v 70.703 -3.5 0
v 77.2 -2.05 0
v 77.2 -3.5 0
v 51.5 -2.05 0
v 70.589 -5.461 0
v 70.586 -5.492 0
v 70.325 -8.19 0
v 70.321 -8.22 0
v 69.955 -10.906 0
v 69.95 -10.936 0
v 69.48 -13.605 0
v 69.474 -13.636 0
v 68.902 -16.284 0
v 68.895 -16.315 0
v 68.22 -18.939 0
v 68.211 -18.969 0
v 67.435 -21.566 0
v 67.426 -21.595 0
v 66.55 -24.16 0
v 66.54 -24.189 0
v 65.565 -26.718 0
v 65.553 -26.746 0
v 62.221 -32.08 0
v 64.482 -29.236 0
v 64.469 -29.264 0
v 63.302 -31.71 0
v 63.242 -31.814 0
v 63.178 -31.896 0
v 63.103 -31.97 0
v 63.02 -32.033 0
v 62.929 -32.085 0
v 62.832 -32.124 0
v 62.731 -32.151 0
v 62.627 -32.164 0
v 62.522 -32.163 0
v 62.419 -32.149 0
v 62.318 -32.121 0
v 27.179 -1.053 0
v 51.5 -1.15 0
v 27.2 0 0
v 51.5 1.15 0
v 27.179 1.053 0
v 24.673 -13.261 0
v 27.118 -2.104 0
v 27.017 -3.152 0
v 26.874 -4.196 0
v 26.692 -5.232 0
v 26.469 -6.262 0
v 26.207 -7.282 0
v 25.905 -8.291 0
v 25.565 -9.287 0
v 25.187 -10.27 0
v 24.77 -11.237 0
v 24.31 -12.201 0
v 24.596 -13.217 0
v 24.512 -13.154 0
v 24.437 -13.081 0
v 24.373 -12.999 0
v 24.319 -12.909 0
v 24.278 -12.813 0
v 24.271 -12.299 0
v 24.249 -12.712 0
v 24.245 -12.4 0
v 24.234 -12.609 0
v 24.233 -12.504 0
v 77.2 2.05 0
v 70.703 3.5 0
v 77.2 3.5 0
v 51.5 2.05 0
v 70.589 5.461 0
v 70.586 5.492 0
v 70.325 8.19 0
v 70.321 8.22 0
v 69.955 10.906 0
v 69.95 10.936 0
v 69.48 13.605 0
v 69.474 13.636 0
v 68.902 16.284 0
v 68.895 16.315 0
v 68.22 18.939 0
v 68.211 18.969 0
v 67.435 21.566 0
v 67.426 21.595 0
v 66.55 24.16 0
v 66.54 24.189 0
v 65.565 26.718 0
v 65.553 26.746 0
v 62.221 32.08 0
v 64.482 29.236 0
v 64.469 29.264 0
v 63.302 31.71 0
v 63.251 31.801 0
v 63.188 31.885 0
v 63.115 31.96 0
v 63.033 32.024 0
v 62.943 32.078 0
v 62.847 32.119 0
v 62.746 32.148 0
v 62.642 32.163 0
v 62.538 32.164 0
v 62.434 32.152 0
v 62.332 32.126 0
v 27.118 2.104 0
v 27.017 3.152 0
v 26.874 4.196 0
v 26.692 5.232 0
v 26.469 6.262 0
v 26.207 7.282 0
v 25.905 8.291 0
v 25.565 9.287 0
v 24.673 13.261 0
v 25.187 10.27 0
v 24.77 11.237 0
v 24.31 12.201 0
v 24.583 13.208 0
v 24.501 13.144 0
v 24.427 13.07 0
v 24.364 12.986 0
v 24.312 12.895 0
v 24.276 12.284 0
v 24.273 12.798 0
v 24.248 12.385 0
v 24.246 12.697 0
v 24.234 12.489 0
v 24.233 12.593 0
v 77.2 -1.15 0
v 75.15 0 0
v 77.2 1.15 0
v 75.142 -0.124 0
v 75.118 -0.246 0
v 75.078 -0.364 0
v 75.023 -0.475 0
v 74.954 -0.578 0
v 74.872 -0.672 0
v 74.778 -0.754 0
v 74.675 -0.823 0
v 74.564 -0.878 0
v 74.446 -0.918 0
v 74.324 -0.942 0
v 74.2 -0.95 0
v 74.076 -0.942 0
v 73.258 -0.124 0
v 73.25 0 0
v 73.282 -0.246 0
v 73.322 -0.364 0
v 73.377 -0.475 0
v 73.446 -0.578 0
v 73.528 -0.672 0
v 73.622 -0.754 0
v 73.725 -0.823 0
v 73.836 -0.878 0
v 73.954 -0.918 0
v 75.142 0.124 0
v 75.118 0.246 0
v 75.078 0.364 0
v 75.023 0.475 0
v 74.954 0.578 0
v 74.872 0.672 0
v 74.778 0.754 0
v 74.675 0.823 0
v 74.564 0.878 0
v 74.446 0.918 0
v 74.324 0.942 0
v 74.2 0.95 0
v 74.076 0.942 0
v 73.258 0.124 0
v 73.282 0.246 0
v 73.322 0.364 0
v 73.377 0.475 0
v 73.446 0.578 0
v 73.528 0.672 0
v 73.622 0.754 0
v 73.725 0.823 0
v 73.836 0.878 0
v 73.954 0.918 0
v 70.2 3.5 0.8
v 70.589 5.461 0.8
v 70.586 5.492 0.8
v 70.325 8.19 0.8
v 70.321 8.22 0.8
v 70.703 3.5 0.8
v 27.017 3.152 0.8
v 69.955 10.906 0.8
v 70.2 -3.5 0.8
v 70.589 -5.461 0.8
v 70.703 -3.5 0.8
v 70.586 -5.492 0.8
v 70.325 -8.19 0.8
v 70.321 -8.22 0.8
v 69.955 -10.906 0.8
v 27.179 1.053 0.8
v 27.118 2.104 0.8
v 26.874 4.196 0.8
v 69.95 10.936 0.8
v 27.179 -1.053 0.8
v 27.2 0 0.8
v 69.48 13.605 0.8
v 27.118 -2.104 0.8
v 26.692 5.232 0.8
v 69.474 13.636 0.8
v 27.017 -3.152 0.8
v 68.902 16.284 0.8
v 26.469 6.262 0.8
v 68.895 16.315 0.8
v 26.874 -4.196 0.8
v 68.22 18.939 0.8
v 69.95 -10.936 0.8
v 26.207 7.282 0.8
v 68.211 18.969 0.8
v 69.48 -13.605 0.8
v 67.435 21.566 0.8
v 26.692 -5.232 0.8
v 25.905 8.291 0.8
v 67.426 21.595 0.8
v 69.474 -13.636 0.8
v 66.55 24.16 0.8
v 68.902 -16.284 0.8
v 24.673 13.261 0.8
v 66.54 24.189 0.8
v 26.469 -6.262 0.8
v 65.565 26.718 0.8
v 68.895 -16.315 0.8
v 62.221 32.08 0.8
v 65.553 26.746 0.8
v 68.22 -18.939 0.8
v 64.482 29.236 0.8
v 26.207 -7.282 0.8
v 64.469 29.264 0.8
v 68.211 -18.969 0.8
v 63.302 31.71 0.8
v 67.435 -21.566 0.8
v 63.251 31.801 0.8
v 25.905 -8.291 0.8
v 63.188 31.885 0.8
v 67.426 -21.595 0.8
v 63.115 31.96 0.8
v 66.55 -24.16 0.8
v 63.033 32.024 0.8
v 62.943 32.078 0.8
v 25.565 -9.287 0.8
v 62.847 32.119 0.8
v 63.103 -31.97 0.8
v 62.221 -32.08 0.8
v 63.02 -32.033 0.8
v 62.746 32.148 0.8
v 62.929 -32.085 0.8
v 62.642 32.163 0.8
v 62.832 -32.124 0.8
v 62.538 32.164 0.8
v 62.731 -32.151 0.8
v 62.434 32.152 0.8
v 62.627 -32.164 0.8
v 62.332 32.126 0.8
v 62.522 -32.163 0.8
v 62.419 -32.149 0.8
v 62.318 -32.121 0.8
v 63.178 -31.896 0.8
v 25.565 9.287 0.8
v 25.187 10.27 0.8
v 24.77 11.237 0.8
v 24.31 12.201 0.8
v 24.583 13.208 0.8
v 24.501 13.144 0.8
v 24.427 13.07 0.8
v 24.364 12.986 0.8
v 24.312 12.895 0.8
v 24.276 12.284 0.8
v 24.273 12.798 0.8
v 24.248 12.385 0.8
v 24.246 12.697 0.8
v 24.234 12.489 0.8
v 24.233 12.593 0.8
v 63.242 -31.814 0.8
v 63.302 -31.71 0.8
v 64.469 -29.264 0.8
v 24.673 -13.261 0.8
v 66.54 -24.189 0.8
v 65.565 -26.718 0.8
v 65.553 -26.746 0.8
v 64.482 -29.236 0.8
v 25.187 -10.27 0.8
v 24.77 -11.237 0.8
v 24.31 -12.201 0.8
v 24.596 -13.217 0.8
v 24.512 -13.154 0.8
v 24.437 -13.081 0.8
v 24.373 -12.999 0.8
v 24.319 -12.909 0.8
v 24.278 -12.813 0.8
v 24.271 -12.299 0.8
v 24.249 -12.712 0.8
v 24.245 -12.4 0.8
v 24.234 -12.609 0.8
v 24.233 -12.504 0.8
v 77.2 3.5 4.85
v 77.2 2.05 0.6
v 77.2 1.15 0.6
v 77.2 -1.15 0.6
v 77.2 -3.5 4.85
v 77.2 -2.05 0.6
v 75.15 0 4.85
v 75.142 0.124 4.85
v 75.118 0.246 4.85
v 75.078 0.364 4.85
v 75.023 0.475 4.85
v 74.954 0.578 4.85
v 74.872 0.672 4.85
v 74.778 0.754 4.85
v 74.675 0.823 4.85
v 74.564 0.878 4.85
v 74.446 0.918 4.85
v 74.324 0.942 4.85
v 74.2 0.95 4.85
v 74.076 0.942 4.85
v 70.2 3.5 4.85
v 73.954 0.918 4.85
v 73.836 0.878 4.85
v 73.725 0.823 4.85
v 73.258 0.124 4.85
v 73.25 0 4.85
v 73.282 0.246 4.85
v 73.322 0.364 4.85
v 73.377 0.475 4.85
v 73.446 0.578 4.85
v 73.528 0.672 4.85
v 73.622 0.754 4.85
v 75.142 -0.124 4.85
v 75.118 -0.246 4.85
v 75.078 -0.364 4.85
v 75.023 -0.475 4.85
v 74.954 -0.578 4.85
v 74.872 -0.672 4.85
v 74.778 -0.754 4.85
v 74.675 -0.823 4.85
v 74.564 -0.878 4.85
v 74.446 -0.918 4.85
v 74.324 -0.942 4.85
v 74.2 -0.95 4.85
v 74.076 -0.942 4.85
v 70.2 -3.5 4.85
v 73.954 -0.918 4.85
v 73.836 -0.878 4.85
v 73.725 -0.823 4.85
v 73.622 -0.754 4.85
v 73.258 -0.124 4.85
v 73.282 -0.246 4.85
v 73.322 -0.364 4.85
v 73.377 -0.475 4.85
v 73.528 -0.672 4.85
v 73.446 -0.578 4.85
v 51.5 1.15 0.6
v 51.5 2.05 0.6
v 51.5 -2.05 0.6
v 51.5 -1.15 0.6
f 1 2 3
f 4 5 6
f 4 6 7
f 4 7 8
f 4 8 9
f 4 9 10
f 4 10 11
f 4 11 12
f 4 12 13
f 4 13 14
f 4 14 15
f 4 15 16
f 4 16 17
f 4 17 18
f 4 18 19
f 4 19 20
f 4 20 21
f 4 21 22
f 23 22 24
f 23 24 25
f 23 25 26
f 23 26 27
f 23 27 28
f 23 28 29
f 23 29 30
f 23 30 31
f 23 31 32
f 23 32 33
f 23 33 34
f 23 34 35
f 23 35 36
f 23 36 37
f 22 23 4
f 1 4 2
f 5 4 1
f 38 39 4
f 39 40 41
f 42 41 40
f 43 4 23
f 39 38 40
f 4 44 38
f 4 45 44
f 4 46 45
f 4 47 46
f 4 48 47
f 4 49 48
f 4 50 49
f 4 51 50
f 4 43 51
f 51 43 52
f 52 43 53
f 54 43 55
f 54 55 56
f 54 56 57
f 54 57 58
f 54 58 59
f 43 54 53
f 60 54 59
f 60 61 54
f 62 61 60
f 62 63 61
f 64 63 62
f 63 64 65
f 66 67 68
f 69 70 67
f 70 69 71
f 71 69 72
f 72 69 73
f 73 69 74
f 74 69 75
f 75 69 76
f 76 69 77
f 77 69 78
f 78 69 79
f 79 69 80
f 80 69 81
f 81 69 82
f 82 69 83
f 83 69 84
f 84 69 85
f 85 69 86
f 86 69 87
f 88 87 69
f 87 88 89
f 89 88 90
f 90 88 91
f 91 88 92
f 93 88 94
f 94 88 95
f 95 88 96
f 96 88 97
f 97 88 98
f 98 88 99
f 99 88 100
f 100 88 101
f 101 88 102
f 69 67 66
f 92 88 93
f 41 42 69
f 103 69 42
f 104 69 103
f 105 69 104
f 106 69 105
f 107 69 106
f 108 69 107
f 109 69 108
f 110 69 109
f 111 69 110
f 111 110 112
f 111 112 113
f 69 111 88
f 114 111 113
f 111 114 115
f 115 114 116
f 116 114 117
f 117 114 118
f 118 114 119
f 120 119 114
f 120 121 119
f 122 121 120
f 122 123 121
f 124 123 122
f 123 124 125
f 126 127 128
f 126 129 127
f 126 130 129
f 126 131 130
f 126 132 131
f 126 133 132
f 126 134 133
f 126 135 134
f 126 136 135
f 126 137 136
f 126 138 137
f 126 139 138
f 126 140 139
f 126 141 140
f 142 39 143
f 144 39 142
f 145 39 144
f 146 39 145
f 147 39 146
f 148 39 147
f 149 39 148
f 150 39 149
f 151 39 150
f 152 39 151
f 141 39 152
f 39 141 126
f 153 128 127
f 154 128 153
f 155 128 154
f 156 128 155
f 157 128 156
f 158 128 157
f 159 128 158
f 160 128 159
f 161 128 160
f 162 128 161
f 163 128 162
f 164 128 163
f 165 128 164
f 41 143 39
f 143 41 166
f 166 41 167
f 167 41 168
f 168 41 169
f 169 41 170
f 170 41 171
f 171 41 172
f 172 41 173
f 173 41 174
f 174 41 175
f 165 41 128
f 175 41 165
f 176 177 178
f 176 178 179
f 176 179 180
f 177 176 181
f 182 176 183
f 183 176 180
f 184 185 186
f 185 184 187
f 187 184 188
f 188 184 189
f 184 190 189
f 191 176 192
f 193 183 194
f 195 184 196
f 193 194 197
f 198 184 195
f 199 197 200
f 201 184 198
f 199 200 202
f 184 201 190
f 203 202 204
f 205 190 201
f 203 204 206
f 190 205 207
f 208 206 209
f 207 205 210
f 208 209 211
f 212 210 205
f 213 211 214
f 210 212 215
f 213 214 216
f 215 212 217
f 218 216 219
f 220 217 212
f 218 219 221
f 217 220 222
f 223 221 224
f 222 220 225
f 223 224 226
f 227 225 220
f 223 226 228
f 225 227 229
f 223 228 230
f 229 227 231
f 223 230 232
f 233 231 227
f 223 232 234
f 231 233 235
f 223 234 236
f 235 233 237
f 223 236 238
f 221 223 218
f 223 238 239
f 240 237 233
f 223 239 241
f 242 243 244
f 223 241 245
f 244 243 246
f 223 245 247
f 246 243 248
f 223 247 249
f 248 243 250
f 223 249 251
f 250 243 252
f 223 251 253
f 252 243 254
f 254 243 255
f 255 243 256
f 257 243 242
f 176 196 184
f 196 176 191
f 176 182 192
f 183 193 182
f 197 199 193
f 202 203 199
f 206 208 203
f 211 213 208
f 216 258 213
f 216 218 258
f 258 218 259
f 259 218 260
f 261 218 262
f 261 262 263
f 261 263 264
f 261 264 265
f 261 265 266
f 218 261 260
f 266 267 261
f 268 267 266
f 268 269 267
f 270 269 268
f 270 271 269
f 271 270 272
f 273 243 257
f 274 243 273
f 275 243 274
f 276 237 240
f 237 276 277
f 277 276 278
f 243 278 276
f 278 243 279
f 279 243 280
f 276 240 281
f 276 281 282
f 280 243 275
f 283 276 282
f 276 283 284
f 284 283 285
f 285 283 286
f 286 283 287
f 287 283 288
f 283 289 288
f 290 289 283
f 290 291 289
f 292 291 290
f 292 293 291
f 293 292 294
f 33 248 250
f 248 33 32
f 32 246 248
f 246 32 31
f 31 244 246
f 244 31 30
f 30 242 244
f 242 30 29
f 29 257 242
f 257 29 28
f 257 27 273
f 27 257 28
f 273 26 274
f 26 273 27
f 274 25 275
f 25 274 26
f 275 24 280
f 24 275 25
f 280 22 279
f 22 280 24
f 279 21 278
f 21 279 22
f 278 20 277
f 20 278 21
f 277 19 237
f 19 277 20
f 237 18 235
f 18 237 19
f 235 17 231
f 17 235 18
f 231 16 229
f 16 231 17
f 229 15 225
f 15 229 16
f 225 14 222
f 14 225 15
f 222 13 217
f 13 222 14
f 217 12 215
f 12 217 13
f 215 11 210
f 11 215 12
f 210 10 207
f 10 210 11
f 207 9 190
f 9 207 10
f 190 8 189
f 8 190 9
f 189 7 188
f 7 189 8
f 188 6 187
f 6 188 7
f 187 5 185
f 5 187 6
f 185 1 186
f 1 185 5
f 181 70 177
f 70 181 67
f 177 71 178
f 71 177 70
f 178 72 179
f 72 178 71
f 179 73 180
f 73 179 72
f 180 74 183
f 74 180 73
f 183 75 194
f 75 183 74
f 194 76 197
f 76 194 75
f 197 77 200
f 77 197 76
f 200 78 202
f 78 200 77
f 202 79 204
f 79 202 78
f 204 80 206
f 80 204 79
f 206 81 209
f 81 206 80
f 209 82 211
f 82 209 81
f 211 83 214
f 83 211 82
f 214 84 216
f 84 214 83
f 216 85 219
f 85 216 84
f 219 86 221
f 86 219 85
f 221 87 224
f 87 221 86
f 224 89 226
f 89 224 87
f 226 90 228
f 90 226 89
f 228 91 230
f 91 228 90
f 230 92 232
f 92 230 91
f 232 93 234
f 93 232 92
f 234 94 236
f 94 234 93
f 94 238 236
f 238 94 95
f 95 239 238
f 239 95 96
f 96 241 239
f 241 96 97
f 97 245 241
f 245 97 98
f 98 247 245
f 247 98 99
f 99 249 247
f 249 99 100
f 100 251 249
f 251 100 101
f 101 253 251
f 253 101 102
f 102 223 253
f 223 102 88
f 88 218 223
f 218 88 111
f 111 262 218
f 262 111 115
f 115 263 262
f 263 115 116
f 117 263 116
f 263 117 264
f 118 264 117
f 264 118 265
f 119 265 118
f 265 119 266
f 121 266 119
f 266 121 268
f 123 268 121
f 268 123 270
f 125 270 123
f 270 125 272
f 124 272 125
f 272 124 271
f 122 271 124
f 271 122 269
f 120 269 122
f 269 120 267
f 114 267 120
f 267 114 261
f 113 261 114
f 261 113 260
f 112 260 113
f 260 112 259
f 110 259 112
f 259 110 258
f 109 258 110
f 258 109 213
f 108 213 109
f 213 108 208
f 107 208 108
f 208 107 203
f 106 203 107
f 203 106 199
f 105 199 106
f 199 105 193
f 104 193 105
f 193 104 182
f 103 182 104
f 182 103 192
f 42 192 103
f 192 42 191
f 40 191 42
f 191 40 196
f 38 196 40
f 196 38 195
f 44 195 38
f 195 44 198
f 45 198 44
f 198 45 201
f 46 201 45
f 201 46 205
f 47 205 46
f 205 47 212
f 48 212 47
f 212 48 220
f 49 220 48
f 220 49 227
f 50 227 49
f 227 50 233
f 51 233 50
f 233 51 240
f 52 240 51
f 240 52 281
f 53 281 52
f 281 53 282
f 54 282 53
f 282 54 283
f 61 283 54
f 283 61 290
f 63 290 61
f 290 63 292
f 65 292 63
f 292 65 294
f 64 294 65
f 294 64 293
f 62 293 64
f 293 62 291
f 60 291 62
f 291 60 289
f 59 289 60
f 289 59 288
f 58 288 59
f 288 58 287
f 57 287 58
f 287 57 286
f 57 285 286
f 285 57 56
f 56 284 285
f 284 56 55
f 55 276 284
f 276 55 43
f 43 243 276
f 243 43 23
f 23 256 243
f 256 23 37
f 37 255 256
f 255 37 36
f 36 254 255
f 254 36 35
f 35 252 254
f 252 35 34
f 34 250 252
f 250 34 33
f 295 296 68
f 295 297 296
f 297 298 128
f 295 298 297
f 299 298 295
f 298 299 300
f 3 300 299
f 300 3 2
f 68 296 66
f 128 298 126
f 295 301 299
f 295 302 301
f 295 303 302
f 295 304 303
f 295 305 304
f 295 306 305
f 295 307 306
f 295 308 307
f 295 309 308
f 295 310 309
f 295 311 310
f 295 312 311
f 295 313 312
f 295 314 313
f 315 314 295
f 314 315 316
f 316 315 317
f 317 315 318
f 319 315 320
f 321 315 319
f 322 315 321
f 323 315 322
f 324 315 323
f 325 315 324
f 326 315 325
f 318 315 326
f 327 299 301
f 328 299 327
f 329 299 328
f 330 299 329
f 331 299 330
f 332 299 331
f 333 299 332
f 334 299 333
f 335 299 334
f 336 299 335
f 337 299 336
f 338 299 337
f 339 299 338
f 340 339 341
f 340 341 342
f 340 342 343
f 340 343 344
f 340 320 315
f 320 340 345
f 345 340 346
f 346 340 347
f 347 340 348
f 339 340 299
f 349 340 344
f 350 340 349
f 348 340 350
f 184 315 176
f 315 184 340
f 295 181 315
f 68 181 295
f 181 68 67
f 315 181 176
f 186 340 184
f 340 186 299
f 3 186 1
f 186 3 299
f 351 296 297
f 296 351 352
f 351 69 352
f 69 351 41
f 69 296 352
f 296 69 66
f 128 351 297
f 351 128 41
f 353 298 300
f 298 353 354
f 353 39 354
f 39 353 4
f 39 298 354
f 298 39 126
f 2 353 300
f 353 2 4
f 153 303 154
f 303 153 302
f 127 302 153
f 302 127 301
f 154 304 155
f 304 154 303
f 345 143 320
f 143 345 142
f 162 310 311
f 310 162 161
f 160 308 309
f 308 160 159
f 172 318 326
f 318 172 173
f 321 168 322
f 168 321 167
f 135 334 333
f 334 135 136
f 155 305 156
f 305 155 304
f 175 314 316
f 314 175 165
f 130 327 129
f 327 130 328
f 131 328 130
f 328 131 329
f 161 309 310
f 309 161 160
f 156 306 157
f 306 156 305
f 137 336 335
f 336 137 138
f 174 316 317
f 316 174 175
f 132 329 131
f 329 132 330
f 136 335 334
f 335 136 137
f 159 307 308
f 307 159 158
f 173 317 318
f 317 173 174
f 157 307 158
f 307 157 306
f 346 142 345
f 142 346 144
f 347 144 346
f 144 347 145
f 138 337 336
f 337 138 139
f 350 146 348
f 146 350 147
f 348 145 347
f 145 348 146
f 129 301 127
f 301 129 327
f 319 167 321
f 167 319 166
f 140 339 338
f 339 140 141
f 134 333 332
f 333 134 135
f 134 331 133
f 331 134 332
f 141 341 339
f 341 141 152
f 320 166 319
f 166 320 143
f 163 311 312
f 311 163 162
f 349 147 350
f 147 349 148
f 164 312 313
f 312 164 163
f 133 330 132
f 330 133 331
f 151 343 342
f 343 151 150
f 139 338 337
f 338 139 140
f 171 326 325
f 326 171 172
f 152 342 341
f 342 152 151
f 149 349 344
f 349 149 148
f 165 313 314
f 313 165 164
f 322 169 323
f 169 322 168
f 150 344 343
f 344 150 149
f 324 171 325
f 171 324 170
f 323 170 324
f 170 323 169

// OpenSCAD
// file: parameters.scad
// =============================================================================
// Gen-BR — nightly 2026-10-09 (physics_scorer, honest magpylib watts)
// Rotor-only swap for Gen-BO: the diametric Ø5 assists move from ±7 mm to ±6.2 mm around the R50 pole ring (R43.8/50/56.2), the closest spacing that still leaves a 0.9 mm printed web between Ø5.3 pockets (rule ≥0.8). Everything else — bobbins, 595 t windings, stator, Ø134 steel — is Gen-BO. Tonight's 138-row refine scan (ring radius 49–51, coil radii ±0.5, build ±0.4, copper height 7.9–8.3) found nothing better: the 8p/6c flush-seat family is saturated under the ~370 m wire budget, so this is a hair-width step (about +0.2 % over Gen-BO), not a breakthrough.
// Clocking 0 deg (magnets N facing S) + D-flat keyed bore + index notch + flip-symmetric hole map.
// Windable 2-piece bobbin; turns = physics_scorer turns_fit; copper only between flanges.
// Steel back-iron: 2× Ø134 × 4.76 mm (3/16") mild-steel discs (steel_backiron_disc.dxf); magnets sit ON the steel
// (through-pockets) -> score with --back-iron.
// =============================================================================
topology            = "dual_rotor";

// --- Wire / winding (physics_scorer winding-fit) -------------------------------
wire_awg            = 26;
wire_od             = 0.45;     // insulated OD mm (bare 0.405)
fill_realistic      = 0.65;     // insulated-wire area / window (DENSE layered wind with a jig; scorer cap 0.65)
turns               = 595;       // = physics_scorer turns_fit (do NOT raise)
coil_former_type    = "bobbin";
coil_core_inset     = 18.00;     // radial copper build: hub = copper boundary inset by this
wind_build_axial    = 0.0;      // nothing proud of the flanges
wind_build_radial   = 0.0;

// --- Bobbin (base + lid) ---------------------------------------------------------
coil_id_r           = 28.00;    // copper boundary sector
coil_od_r           = 70.00;
span_deg            = 53.24;    // = pitch - 2*asin((wall+0.85)/coil_id_r) -> >=1.2 mm stator web
former_web          = 8.10;     // copper height between flanges (TALL copper: steel keeps Bz up)
flange_t            = 0.80;     // >= 0.8 mm FDM wall rule (tall winds push on the flanges)
wall                = 0.80;     // flange lip beyond copper
former_bare_h       = former_web + 2 * flange_t;
coil_envelope_h     = former_bare_h + 2 * wind_build_axial;
tab_w               = 7.0;
tab_len             = 7.0;
tab_h               = former_bare_h / 2;
pin_d               = 1.9;      // 1.75 mm filament locating pin
coil_mount_r        = coil_od_r + 0.2 + 4.0;
lead_y              = 1.6;
lead_slot_w         = 0.9;
lead_groove_d       = 0.6;

// --- Gap -------------------------------------------------------------------------
run_clear           = 0.50;     // rotor face -> flange
gap_spacer_h        = run_clear + wind_build_axial;
m2m                 = coil_envelope_h + 2 * run_clear;   // rotor face to rotor face (= gap_sleeve length)

// --- Stator ----------------------------------------------------------------------
coil_stations       = 6;
bay_clear           = 0.25;
stator_thick        = former_bare_h;                        // bobbins flush both faces
stator_od           = 158;
shaft_clear_stator  = 14.0;     // stator is static; gap sleeve OD 12 spins inside

// --- Rotor(s) --------------------------------------------------------------------
magnet_Br           = 1.43;     // N52
magnet_d_large      = 20.0;
magnet_h_large      = 5.0;      // one O20x5 per pocket
magnet_h_small      = 5.0;      // one O5x5 per pocket
halbach_magnetisation = "diametric"; // O5x5 assist magnets MUST be DIAMETRICALLY magnetised (tangential)
rotor_b_same_axis   = true;     // same-index magnets share one axis: N faces S across the gap
large_pocket_d      = 20.3;
small_pocket_d      = 5.3;
pocket_h            = 5.00;     // THROUGH the carrier: magnet back face sits on the steel disc (FLUSH seat: carrier = magnet height, magnet face level with the rotor face)
large_n             = 8;
R_large             = 50.0;
R_small_inner       = 43.8;
R_small_mid         = 50.0;
R_small_outer       = 56.2;
small_r_list        = [R_small_inner, R_small_mid, R_small_outer];   // O5 pockets between poles
carrier_od          = 134.0;
carrier_thick       = pocket_h;
hub_h               = 12.0;     // > steel_t + insert: radial set-screw clears the steel
hub_od              = 24.0;     // slim hub so the M4 brace rods fit at R~18 inside the coil ring
hub_insert_d        = 4.0;      // M3 heat-set insert, radial, bears on the D-flat
rotor_b_offset_deg  = 0.0;      // CLOCKING: magnets directly opposite
shaft_key           = "dflat";
dflat_depth         = 0.5;      // 8 mm shaft with 0.5 mm flat (7.5 across flat)
index_notch_d       = 3.0;

// --- Steel back-iron (buyable laser-cut) -------------------------------------------
steel_t             = 4.76;      // mild steel thickness (image method ignores it; sized from steel_flux.py so the return path stays well below saturation)
steel_center_hole   = 26.0;     // slips over the rotor hub (OD 24)
steel_od            = carrier_od;   // steel disc OD = rotor carrier OD

// --- Modular MAX interface ----------------------------------------------------------
shaft_bore          = 8.35;
dflat_x             = 4.0 - dflat_depth + (shaft_bore - 8.0) / 2;
bearing_d           = 21.85;
bearing_h           = 7.2;
m3_clear            = 3.5;
bolt_r_inner        = 30.0;     // M3 steel-disc clamp bolts (inside the magnet ring)
bolt_n_inner        = 4;
bolt_inner_angles   = [0, 90, 180, 270];
bolt_r_outer        = 63.0;     // M3 steel-disc clamp bolts (outside the magnet ring)
bolt_outer_angles   = [45, 135, 225, 315];
flange_bolt_r       = 73.0;     // frame rods: OUTSIDE the rotor OD (rotors spin inside them)
flange_bolt_n       = 6;
flange_bolt_offset  = 30.00;    // between coil stations -> never cuts a lead groove/tab
brace_r             = 18.0;
brace_d             = 4.3;      // temporary M4 jack rods (assembly only)
brace_n             = 4;
brace_angles        = [45, 135, 225, 315];          // flip-symmetric

spacer_pad_od       = 14.0;
spacer_pad_id       = m3_clear;
endbell_od          = 158;
endbell_thick       = 8.0;
endbell_shaft_clear = 10.0;
collar_h            = 10.0;
standoff_od         = 9.0;
frame_standoff_h    = run_clear + carrier_thick + hub_h + collar_h + 2.0;
sleeve_od           = 12.0;
plate_max_mm        = 410;

$fn = 64;
// main file
// Gen-BR — bobbin LID (top flange + locating tab). Print x6, flange face DOWN on the bed.
// CA-glue onto the hub top BEFORE winding. Tab = lap joint into the stator tab pocket; 1.75 mm filament
// pin through pin hole + stator ledge, trim flush. Lead slots carry both leads flush.
include <parameters.scad>;
$fn = 48;
module sector_2d(r_in, r_out, ang) {
    polygon([
        for (a = [-ang/2 : ang/24 : ang/2]) [r_in*cos(a), r_in*sin(a)],
        for (a = [ang/2 : -ang/24 : -ang/2]) [r_out*cos(a), r_out*sin(a)]
    ]);
}
module footprint_2d() { offset(r=wall) sector_2d(coil_id_r, coil_od_r, span_deg); }
module hub_2d()       { offset(delta=-coil_core_inset) sector_2d(coil_id_r, coil_od_r, span_deg); }

difference() {
    union() {
        linear_extrude(flange_t) footprint_2d();
        translate([coil_od_r + 0.2, -tab_w/2, 0]) cube([tab_len, tab_w, tab_h]);
    }
    translate([coil_mount_r, 0, -0.1]) cylinder(d=pin_d, h=tab_h + 1);
    for (y = [lead_y, -lead_y])
        translate([coil_od_r - coil_core_inset - 0.5, y - lead_slot_w/2, -0.1])
            cube([coil_core_inset + tab_len + 2, lead_slot_w, lead_groove_d + 0.1]);
}
